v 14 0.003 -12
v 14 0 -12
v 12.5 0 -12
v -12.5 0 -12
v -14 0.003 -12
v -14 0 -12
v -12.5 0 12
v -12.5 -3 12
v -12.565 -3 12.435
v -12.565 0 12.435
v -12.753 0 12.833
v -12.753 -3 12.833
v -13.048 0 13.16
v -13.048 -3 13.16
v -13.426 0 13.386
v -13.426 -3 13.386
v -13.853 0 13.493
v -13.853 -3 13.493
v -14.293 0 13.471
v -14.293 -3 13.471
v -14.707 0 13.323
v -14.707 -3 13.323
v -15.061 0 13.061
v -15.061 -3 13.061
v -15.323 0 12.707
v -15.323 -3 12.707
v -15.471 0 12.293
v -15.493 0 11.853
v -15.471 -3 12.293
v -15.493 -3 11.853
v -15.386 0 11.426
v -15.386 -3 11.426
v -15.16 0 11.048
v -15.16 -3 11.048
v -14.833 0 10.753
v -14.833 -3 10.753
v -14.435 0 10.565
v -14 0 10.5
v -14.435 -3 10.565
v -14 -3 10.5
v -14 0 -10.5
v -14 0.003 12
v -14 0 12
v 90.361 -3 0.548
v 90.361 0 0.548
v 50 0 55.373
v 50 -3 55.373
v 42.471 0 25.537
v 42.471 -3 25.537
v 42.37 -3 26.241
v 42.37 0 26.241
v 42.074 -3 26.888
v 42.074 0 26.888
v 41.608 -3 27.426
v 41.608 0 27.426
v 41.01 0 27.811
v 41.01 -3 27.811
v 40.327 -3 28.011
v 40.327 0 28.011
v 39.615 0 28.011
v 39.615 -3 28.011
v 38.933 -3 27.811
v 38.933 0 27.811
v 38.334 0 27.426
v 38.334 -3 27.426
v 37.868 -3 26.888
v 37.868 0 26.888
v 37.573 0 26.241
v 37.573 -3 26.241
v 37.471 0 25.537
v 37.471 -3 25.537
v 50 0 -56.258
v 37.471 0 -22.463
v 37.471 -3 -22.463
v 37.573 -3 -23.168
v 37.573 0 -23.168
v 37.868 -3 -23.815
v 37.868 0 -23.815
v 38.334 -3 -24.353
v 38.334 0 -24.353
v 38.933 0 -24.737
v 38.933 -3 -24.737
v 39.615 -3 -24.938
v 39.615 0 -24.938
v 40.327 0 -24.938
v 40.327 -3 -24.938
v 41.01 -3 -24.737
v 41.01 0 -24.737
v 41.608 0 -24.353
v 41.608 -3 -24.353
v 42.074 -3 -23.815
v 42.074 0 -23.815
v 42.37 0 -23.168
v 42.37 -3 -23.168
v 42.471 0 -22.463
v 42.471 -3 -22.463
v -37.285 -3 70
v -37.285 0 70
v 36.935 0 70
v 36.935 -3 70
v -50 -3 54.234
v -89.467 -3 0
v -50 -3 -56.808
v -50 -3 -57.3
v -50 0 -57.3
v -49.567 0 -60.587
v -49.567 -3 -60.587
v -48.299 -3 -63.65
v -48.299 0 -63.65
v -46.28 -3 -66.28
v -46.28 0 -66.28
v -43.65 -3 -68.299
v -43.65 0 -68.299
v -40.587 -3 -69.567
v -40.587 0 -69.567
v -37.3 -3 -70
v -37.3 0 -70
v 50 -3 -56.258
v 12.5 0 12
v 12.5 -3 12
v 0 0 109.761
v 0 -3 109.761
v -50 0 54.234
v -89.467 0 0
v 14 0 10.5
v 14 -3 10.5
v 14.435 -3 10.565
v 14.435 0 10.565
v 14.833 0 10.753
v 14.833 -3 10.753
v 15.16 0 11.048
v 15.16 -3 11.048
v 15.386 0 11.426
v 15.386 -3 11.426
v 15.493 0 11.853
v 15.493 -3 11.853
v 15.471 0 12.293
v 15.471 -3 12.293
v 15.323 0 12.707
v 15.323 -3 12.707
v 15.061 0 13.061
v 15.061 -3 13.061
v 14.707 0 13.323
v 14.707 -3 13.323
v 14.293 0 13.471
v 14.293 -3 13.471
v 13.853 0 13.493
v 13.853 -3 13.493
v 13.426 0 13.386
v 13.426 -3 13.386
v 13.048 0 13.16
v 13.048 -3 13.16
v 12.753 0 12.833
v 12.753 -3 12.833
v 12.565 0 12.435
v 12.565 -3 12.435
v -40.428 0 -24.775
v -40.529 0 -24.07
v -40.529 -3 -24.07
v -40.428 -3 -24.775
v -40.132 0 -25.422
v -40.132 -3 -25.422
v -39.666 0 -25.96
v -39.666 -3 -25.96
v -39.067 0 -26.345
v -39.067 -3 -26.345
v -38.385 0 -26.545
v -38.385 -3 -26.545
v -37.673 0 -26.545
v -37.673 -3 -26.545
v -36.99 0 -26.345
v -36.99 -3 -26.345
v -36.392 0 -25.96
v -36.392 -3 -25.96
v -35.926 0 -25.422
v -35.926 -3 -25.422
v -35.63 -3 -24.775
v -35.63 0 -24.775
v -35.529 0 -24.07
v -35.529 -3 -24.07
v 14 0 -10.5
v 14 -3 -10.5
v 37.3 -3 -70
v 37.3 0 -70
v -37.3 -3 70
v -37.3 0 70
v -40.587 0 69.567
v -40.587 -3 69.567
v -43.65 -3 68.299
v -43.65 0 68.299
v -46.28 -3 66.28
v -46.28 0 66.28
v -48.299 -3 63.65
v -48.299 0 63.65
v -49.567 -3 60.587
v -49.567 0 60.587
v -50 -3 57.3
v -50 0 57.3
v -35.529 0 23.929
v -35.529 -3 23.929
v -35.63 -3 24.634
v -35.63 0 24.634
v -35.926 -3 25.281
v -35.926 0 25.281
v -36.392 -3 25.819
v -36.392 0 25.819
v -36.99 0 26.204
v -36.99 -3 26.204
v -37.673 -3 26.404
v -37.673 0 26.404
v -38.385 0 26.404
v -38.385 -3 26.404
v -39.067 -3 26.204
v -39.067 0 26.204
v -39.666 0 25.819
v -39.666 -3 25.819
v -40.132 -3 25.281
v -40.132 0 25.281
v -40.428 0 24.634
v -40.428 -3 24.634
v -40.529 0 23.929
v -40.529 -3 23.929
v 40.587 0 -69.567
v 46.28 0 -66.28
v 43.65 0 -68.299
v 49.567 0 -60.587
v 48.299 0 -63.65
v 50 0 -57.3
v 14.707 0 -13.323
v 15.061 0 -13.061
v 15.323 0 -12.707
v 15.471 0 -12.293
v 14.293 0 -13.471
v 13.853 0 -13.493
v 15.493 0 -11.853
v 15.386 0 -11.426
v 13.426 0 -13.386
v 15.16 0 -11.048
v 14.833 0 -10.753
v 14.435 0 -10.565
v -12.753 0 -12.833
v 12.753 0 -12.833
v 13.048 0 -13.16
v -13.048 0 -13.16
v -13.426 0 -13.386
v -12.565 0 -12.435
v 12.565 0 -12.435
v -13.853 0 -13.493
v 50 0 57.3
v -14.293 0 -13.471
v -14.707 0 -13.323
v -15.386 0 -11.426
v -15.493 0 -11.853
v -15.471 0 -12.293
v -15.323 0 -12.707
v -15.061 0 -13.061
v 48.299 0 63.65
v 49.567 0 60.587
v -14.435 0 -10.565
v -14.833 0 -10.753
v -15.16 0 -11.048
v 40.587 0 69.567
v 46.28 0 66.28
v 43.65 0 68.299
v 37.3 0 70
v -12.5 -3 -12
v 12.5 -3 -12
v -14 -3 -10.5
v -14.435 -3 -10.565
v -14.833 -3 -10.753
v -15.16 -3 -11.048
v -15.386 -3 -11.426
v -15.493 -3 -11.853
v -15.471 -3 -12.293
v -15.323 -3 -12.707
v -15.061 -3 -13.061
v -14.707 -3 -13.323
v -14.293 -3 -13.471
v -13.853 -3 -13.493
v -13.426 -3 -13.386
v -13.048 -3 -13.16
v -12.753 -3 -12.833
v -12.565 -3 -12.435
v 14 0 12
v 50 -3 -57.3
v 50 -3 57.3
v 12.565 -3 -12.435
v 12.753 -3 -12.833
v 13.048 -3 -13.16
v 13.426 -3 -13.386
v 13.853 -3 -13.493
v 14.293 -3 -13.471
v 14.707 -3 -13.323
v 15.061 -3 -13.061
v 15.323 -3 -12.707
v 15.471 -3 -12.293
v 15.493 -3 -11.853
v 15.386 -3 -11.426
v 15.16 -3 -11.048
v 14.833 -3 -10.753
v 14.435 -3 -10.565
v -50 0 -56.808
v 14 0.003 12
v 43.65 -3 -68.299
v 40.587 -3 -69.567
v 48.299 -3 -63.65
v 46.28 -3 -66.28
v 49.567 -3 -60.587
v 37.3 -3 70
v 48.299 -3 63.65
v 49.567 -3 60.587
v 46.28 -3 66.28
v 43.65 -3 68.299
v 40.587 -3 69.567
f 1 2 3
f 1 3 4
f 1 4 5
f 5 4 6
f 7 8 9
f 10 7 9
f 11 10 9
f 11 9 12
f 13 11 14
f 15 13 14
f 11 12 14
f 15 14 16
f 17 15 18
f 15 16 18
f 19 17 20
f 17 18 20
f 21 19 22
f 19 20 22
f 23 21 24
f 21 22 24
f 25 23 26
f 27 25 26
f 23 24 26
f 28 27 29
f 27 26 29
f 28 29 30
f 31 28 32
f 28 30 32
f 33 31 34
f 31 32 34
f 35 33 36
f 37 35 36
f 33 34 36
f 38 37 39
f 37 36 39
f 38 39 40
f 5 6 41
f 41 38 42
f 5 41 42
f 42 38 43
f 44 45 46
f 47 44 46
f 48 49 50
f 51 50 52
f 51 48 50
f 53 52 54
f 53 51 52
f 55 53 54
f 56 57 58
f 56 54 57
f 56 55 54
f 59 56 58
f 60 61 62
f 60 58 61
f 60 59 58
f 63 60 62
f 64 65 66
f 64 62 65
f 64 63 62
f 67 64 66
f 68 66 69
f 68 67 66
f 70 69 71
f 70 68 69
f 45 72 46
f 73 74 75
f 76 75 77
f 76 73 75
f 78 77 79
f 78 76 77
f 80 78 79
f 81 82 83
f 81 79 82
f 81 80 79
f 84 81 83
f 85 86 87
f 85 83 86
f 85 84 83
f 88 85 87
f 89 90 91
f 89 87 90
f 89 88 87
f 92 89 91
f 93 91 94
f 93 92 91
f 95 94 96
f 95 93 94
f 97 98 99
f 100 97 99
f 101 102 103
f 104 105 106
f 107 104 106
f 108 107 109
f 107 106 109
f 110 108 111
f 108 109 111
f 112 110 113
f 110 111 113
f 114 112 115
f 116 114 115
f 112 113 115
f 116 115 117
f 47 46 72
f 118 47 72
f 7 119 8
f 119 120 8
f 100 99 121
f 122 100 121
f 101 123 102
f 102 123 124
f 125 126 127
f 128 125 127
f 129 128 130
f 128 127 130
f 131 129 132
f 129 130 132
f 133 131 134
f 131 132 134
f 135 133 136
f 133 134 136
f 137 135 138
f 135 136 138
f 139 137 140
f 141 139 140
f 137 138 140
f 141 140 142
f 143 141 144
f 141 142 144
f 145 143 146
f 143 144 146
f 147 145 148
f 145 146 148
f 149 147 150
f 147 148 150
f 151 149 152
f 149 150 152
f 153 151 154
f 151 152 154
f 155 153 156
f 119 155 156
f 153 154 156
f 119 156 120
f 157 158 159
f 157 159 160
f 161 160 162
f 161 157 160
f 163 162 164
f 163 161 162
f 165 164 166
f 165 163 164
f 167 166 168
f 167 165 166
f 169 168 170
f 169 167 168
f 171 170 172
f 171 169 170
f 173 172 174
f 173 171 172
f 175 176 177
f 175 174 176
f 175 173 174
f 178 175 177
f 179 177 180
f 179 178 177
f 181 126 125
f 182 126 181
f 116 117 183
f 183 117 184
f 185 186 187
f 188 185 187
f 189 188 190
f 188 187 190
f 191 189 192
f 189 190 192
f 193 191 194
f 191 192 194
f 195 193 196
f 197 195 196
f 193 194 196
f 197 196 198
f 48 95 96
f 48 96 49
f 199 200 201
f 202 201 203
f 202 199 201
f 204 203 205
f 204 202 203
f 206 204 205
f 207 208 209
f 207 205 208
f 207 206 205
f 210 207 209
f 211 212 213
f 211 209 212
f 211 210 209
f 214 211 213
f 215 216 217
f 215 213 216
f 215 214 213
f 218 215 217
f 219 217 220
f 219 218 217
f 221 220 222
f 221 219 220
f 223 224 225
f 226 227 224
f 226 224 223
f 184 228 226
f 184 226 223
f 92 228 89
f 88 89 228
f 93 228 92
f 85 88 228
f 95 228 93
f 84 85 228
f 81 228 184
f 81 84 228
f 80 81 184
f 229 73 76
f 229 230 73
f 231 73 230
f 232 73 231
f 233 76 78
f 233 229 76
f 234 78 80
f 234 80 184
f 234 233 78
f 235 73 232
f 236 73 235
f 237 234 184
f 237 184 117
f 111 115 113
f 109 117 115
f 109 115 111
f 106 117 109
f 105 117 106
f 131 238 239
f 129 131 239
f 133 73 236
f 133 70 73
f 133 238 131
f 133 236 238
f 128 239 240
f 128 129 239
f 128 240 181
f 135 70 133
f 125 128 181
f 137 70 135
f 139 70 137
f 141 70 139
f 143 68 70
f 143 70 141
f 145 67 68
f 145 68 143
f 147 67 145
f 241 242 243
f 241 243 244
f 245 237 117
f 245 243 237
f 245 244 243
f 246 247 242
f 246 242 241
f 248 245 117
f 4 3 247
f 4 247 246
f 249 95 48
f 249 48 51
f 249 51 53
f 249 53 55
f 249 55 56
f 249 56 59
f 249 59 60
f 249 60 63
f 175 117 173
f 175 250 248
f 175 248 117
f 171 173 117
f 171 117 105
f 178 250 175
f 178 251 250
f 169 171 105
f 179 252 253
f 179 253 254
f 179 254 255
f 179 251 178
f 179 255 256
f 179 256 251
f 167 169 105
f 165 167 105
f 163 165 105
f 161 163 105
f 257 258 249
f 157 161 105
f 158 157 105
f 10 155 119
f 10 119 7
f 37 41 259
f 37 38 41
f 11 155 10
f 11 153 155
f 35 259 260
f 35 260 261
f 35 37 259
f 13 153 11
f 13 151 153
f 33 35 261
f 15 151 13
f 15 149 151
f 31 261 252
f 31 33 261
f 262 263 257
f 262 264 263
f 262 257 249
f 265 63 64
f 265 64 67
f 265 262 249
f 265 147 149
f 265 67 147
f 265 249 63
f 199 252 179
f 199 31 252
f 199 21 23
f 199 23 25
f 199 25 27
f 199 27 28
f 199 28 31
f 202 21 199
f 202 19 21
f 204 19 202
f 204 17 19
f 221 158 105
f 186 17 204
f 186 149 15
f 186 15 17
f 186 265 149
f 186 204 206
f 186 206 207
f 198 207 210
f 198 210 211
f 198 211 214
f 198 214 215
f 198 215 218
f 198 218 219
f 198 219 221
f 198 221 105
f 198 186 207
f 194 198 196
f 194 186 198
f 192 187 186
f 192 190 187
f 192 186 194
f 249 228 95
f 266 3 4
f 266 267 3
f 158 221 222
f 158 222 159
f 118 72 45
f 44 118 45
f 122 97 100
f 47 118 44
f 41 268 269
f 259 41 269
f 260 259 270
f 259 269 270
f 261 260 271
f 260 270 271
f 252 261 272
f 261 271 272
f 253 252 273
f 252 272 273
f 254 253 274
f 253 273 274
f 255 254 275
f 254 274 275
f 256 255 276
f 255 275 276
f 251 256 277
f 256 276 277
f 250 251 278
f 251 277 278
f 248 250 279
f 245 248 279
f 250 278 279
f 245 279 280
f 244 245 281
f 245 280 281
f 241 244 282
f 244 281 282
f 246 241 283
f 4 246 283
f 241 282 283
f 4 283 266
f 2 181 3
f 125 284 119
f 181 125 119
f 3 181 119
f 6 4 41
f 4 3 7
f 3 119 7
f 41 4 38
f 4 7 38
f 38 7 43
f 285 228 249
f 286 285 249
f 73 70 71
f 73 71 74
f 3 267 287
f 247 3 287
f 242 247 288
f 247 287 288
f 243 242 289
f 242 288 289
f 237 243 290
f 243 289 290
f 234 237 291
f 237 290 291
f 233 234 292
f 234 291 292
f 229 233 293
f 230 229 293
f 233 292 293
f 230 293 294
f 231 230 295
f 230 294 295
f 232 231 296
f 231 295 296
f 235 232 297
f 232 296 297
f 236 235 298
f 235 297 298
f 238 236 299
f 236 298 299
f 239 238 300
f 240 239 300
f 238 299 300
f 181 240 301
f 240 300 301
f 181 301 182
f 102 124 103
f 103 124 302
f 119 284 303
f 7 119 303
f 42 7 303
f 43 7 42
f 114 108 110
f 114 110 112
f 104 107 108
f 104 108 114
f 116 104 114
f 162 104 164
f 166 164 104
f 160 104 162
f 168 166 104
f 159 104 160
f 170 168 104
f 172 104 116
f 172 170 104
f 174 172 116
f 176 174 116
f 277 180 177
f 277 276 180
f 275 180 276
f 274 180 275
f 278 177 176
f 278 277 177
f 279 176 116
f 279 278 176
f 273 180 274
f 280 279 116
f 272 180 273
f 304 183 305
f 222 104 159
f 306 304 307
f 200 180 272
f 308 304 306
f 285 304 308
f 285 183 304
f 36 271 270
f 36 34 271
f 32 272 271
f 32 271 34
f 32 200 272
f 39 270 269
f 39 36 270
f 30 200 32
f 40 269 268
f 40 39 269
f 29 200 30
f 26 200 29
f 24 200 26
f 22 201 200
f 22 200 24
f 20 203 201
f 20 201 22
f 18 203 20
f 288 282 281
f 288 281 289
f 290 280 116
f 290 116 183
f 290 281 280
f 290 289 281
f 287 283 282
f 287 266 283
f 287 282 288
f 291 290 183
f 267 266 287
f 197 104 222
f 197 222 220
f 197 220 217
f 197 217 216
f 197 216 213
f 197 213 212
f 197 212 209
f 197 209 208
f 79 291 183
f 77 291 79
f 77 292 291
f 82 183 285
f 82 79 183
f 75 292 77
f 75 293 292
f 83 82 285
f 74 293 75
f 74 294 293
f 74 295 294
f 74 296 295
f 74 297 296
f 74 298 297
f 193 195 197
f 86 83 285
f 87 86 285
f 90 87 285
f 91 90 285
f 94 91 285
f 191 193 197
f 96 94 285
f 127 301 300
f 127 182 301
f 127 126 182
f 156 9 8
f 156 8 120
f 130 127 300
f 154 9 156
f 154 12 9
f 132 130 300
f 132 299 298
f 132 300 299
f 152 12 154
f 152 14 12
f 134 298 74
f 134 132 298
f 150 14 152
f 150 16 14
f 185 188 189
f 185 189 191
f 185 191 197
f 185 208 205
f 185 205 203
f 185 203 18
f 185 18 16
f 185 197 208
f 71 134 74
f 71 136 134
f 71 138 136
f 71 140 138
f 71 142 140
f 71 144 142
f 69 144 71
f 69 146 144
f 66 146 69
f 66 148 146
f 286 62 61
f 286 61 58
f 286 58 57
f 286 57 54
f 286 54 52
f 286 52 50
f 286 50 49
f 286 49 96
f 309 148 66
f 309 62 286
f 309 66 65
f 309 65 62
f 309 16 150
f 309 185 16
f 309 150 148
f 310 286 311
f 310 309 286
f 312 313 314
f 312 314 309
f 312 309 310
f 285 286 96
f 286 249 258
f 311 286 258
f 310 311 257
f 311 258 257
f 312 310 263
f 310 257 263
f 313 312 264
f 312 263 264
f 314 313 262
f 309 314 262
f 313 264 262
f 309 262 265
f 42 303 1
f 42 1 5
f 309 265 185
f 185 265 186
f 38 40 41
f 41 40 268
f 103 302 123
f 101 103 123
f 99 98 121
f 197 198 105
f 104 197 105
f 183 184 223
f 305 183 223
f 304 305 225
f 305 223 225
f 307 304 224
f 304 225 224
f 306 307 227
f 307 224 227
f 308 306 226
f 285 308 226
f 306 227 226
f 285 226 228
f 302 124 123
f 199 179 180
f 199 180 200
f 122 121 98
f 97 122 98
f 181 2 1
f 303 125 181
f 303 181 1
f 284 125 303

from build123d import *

# Parameters (mm, degrees)
F2_DEPTH  = 3
F3_DEPTH  = 25.4
F4_DEPTH  = 3
F5_W      = 28
F5_H      = 24
F7_DEPTH  = 85.948869586
F8_DEPTH  = 0.5817031488
F8_FACE_W = 28
F8_FACE_H = 24
F9_DEPTH  = 13.2057741284
F10_DEPTH = 0.00254
F12_D     = 3
F11_W     = 28
F11_H     = 24
F13_DEPTH = 0.0001


with BuildPart() as f2:
    # F1 (on face) → F2 (new body)
    with BuildSketch(Plane.XZ):
        Polygon((-50.000027, -56.8075293898), (-50.000027, 54.2340109895), (-89.4667699399, 0), align=None)
    extrude(amount=F2_DEPTH)


with BuildPart() as f2b:
    # F0 (on Front) → F2, piece 2 (new body)
    with BuildSketch(Plane.XZ):
        with BuildLine():
            Line((37.300027, 69.999987), (-37.300027, 69.999987))
            ThreePointArc((-37.300027, 69.999987), (-46.2802831211, 66.2802431211), (-50.000027, 57.299987))
            Line((-50.000027, 57.299987), (-50.000027, -57.299987))
            ThreePointArc((-50.000027, -57.299987), (-46.2802831211, -66.2802431211), (-37.300027, -69.999987))
            Line((-37.300027, -69.999987), (37.300027, -69.999987))
            ThreePointArc((37.300027, -69.999987), (46.2802831211, -66.2802431211), (50.000027, -57.299987))
            Line((50.000027, -57.299987), (50.000027, 57.299987))
            ThreePointArc((50.000027, 57.299987), (46.2802831211, 66.2802431211), (37.300027, 69.999987))
        make_face()
    extrude(amount=F2_DEPTH)

    # F1 (on face) → F3 (cut)
    with BuildSketch(Plane.XZ):
        with BuildLine():
            ThreePointArc((-35.5288300744, 23.9294660024), (-38.0288250744, 26.4294610024), (-40.5288200744, 23.9294660024))
            Line((-40.5288200744, 23.9294660024), (-40.5288200744, -24.0704379976))
            ThreePointArc((-40.5288200744, -24.0704379976), (-38.0288250744, -26.5704329976), (-35.5288300744, -24.0704379976))
            Line((-35.5288300744, -24.0704379976), (-35.5288300744, 23.9294660024))
        make_face()
        with BuildLine():
            ThreePointArc((42.4712679256, 25.5365972154), (39.9712729256, 28.0365922154), (37.4712779256, 25.5365972154))
            Line((37.4712779256, 25.5365972154), (37.4712779256, -22.4633067846))
            ThreePointArc((37.4712779256, -22.4633067846), (39.9712729256, -24.9633017846), (42.4712679256, -22.4633067846))
            Line((42.4712679256, -22.4633067846), (42.4712679256, 25.5365972154))
        make_face()
    extrude(amount=F3_DEPTH, mode=Mode.SUBTRACT)

    # F5 (on face) → F7 (cut)
    with BuildSketch(Plane(origin=(0, 0, 0), x_dir=(-1, 0, 0), z_dir=(0, 1, 0))):
        Rectangle(F5_W, F5_H)
    extrude(amount=-F7_DEPTH, mode=Mode.SUBTRACT)

    # F5 (on face) → F8 (join)
    with BuildSketch(Plane(origin=(0, 0, 0), x_dir=(-1, 0, 0), z_dir=(0, 1, 0))):
        Rectangle(F5_W, F5_H)
    extrude(amount=-F8_DEPTH)

    # F8_face (on face) + F6 (on face) → F9 (cut)
    with BuildSketch(Plane(origin=(0, -0.5817031488, 0), x_dir=(-1, 0, 0), z_dir=(0, -1, 0))):
        Rectangle(F8_FACE_W, F8_FACE_H)
    with BuildSketch(Plane(origin=(0, 0, 0), x_dir=(-1, 0, 0), z_dir=(0, 1, 0))):
        with BuildLine():
            ThreePointArc((-6.0618435964, -5.8568658896), (-7.3318436153, -7.1268659085), (-6.0618435964, -8.3968659274))
            Line((-6.0618435964, -8.3968659274), (7.4327886105, -8.3968659274))
            ThreePointArc((7.4327886105, -8.3968659274), (8.7027886294, -7.1268659085), (7.4327886105, -5.8568658896))
            Line((7.4327886105, -5.8568658896), (-6.0618435964, -5.8568658896))
        make_face()
        with BuildLine():
            ThreePointArc((-4.9149026163, 7.7529164374), (-6.1849026352, 6.4829164185), (-4.9149026163, 5.2129163995))
            Line((-4.9149026163, 5.2129163995), (7.4327886105, 5.2129163995))
            ThreePointArc((7.4327886105, 5.2129163995), (8.7027886294, 6.4829164185), (7.4327886105, 7.7529164374))
            Line((7.4327886105, 7.7529164374), (-4.9149026163, 7.7529164374))
        make_face()
    extrude(amount=-F9_DEPTH, dir=(0, -1, 0), mode=Mode.SUBTRACT)

    # F12 (through all)
    with Locations(Plane(origin=(0, 0, 0), x_dir=(-1, 0, 0), z_dir=(0, 1, 0))):
        with Locations((14, 12), (14, -12), (-14, 12), (-14, -12)):
            Hole(F12_D / 2)



with BuildPart() as f4:
    # F1 (on face) → F4 (new body)
    with BuildSketch(Plane.XZ):
        Polygon((-37.2853103149, 69.999987), (36.934749776, 69.999987), (0, 109.7605493885), align=None)
    extrude(amount=F4_DEPTH)


with BuildPart() as f4b:
    # F1 (on face) → F4, piece 2 (new body)
    with BuildSketch(Plane.XZ):
        Polygon((90.3611274951, 0.5484864628), (50.000027, 55.3734117853), (50.000027, -56.2577831508), align=None)
    extrude(amount=F4_DEPTH)


with BuildPart() as f10:
    # F5 (on face) → F10 (new body)
    with BuildSketch(Plane(origin=(0, 0, 0), x_dir=(-1, 0, 0), z_dir=(0, 1, 0))):
        Rectangle(F5_W, F5_H)
    extrude(amount=F10_DEPTH)


with BuildPart() as f2b_1:
    add(f2b.part)

    add(f10.part)  # F13 merges F10
    # F11 (on face) → F13 (join)
    with BuildSketch(Plane(origin=(0, 0, 0), x_dir=(-1, 0, 0), z_dir=(0, 1, 0))):
        Rectangle(F11_W, F11_H)
    extrude(amount=F13_DEPTH)


solid = Compound([f2.part, f4.part, f4b.part, f2b_1.part])
